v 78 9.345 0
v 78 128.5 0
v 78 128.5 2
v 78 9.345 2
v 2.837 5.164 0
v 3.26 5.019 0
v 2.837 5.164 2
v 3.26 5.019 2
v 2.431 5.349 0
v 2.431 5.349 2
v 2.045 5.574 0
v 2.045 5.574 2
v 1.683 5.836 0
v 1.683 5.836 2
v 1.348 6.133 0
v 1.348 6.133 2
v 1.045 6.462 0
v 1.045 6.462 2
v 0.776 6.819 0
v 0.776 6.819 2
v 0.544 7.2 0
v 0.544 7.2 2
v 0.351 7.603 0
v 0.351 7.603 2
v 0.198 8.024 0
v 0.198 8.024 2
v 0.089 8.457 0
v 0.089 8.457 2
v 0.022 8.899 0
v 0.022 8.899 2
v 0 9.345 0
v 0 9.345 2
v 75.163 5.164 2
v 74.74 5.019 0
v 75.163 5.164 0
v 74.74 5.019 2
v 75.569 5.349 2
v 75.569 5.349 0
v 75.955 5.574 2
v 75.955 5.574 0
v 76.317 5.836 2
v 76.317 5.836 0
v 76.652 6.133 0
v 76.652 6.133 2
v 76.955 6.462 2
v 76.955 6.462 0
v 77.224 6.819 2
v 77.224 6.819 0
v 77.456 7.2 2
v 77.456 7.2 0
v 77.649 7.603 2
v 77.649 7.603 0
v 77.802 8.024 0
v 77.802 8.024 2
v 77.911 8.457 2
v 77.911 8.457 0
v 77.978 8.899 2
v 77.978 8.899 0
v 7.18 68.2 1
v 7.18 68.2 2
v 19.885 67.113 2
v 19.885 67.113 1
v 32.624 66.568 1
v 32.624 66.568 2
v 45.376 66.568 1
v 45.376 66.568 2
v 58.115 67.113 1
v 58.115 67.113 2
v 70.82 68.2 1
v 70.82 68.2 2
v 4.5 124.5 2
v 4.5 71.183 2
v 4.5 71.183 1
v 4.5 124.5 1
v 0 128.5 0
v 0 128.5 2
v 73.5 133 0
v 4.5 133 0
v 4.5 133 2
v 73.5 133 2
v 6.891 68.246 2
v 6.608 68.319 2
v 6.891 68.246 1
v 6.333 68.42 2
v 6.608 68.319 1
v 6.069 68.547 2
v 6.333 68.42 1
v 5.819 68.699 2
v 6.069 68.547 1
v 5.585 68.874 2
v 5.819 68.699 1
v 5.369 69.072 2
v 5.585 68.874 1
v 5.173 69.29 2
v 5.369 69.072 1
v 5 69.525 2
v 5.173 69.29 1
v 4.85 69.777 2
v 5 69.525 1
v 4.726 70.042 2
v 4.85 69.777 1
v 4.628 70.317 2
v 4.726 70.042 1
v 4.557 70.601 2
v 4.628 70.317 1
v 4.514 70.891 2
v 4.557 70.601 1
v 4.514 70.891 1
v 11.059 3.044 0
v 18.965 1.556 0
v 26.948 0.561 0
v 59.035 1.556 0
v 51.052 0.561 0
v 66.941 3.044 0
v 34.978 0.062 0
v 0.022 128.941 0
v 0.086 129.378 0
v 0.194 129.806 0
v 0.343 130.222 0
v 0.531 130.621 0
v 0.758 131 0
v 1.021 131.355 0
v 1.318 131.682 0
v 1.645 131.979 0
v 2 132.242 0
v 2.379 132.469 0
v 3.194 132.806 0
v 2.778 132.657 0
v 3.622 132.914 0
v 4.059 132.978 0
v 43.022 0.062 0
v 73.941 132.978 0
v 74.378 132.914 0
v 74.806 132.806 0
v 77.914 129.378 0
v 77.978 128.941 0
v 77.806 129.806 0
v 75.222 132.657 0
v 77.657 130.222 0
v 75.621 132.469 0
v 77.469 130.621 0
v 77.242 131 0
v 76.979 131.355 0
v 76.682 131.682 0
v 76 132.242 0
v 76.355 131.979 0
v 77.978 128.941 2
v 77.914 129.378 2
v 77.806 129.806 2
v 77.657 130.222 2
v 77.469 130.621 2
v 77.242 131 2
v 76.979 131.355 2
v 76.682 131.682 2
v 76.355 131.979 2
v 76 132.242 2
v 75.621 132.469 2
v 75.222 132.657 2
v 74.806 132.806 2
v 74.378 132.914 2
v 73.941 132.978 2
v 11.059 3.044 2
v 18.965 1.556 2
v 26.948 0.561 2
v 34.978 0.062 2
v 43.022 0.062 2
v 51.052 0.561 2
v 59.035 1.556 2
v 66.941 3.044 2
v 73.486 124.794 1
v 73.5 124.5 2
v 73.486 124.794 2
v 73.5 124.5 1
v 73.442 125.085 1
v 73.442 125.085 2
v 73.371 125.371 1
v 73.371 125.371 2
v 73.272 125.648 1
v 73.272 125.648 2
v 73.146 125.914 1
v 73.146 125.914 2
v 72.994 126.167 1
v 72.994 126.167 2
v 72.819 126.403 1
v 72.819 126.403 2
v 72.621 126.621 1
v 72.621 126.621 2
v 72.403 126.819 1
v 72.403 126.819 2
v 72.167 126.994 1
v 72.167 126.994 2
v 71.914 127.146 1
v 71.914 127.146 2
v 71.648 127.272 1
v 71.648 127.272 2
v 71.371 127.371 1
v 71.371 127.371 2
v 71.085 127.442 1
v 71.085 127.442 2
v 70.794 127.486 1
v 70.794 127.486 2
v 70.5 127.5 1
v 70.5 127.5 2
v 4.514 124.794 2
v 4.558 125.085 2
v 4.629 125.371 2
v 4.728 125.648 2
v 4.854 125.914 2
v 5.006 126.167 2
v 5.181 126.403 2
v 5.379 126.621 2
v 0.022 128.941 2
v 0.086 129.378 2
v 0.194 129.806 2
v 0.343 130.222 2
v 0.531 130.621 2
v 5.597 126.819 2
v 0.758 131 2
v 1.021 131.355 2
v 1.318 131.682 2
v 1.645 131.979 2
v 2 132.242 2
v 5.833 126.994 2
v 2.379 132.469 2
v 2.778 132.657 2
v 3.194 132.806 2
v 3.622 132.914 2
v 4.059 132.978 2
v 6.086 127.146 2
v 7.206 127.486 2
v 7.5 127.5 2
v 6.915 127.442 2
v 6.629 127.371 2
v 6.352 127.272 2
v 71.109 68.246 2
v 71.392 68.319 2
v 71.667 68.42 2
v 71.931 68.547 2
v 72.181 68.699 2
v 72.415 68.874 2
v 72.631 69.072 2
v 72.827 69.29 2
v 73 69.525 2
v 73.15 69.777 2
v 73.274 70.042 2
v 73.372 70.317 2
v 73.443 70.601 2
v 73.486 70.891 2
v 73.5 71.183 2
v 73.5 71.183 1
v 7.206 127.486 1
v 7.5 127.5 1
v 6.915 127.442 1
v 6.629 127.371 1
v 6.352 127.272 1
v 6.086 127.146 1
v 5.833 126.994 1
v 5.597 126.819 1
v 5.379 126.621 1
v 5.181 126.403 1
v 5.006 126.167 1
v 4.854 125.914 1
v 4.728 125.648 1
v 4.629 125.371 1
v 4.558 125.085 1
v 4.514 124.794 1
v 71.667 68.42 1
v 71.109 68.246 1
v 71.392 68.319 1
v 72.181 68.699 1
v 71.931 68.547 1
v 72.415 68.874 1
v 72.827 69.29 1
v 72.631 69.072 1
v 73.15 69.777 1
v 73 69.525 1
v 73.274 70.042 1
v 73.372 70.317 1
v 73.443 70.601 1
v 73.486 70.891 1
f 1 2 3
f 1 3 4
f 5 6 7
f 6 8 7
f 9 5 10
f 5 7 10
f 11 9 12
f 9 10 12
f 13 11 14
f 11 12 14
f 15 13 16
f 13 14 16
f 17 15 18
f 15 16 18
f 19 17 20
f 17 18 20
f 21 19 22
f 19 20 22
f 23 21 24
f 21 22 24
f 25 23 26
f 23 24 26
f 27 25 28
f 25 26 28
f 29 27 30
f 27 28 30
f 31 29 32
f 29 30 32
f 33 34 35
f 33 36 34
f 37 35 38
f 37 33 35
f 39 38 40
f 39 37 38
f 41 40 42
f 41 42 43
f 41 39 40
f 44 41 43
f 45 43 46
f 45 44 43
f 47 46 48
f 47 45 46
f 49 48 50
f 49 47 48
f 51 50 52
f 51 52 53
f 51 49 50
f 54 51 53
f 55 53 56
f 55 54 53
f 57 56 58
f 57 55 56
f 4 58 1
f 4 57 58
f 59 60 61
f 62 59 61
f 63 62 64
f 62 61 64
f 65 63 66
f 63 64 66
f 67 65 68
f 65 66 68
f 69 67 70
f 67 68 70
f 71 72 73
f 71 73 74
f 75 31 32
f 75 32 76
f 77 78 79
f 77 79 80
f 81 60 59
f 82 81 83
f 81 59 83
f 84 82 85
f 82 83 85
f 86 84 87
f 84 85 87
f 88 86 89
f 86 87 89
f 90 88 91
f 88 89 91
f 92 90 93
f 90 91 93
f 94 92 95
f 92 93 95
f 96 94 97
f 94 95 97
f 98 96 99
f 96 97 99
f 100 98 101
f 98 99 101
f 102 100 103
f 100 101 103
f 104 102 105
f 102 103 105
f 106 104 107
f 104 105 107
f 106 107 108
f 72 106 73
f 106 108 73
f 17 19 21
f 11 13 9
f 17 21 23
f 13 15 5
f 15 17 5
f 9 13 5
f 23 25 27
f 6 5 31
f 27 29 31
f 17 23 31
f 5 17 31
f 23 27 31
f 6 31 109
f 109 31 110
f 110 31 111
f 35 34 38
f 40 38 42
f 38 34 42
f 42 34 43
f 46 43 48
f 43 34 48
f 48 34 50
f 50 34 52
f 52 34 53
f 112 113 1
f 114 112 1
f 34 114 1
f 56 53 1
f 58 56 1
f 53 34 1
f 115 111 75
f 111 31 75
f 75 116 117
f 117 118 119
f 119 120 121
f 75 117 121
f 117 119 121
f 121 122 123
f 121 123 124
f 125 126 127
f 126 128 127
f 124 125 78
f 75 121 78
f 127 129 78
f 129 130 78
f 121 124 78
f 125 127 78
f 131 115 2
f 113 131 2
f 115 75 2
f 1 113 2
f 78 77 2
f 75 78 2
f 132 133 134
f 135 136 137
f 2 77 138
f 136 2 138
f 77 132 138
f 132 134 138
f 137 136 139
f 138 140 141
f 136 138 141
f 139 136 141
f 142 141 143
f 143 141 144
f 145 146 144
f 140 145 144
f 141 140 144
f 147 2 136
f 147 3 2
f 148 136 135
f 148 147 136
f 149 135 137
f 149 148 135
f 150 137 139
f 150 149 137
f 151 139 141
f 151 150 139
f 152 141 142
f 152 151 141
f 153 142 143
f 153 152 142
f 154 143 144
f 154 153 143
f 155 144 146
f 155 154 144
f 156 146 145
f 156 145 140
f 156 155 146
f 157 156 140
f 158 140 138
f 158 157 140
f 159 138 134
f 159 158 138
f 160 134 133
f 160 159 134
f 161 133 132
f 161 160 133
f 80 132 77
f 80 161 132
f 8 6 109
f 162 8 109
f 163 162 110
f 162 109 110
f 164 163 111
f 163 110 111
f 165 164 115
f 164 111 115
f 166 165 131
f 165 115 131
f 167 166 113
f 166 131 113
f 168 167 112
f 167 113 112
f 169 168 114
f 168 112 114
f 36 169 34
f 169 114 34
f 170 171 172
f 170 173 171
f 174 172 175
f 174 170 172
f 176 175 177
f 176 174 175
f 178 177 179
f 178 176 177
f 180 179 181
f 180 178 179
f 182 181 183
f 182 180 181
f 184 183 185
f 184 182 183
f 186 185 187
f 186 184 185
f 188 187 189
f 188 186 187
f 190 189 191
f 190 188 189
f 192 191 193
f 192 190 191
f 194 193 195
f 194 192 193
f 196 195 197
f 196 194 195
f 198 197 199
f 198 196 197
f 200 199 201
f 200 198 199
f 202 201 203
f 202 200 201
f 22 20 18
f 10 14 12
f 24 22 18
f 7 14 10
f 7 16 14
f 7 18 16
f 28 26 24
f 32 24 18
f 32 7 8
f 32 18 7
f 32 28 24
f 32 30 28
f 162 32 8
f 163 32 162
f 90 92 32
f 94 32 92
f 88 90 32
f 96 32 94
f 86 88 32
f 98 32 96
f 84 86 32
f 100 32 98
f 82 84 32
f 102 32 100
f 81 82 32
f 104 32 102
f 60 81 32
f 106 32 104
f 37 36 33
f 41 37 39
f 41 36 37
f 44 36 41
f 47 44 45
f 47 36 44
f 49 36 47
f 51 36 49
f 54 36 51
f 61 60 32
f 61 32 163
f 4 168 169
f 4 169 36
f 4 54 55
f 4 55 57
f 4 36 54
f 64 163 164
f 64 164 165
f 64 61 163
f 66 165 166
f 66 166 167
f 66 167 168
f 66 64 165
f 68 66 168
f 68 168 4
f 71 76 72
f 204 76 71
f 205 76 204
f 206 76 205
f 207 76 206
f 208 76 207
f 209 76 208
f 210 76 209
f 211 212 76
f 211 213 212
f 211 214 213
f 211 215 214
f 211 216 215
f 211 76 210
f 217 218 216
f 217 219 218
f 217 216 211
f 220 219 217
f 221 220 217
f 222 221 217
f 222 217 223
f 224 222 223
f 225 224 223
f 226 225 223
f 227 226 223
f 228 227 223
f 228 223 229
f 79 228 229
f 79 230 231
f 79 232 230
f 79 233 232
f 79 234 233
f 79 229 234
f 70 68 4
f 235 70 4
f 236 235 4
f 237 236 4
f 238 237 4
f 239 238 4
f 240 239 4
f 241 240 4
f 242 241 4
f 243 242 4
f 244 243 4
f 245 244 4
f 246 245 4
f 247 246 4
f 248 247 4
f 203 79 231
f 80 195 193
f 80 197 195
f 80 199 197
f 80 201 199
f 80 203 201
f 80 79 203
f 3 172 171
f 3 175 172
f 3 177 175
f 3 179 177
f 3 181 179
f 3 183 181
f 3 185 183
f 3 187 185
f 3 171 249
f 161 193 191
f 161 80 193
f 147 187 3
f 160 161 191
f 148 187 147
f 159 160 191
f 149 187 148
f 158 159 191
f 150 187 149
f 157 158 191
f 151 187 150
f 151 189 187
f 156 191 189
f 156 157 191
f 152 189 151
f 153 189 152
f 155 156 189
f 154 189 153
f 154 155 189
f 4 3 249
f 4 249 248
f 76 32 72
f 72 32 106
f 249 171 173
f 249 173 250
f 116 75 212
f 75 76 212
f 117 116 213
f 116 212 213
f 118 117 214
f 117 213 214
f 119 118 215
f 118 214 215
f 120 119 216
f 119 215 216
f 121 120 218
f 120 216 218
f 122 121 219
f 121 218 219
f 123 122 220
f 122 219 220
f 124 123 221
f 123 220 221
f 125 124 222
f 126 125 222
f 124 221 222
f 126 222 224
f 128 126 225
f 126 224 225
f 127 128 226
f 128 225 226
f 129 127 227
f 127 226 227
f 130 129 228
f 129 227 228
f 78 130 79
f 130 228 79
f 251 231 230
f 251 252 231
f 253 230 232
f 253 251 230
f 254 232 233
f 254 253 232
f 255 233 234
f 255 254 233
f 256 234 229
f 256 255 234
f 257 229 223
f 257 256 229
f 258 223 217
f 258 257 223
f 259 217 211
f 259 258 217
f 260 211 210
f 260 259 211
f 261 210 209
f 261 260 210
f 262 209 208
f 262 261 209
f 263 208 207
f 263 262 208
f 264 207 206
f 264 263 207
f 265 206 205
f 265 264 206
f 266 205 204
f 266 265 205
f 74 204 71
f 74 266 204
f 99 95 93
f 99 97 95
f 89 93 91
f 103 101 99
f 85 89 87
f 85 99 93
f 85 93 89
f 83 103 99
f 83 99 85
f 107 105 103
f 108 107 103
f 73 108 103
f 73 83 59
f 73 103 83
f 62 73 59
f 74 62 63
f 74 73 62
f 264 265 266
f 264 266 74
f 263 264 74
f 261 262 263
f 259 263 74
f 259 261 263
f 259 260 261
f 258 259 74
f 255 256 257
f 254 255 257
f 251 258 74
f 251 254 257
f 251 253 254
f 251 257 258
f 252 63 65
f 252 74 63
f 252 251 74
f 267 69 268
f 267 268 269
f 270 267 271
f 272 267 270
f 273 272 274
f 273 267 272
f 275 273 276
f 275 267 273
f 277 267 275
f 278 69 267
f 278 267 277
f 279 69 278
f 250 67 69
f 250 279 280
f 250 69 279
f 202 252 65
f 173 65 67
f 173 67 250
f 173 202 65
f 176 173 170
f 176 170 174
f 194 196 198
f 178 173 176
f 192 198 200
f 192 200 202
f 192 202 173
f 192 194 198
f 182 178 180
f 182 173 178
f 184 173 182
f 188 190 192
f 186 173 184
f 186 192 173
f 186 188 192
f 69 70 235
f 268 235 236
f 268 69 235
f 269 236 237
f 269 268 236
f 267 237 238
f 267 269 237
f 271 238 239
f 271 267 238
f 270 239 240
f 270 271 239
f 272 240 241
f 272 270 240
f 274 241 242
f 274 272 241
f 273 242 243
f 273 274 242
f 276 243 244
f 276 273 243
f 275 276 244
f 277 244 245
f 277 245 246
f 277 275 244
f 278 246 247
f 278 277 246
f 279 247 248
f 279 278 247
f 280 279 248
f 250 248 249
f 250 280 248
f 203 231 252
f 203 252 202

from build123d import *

# Parameters (mm, degrees)
PAD_DEPTH    = 2
POCKET_DEPTH = 1
FILLET_R     = 3
FILLET001_R  = 4.5


with BuildPart() as part:
    # Sketch → Pad (new body)
    with BuildSketch(Plane.XY):
        with BuildLine():
            ThreePointArc((0, 6), (39, 0), (78, 6))
            Line((78, 133), (78, 6))
            Line((0, 133), (78, 133))
            Line((0, 6), (0, 133))
        make_face()
    extrude(amount=PAD_DEPTH)

    # Sketch001 (on Face6 of Pad) → Pocket (cut)
    with BuildSketch(Plane.XY.offset(2)):
        with BuildLine():
            ThreePointArc((4.5, 68.5), (39, 66.5), (73.5, 68.5))
            Line((73.5, 127.5), (73.5, 68.5))
            Line((4.5, 127.5), (73.5, 127.5))
            Line((4.5, 68.5), (4.5, 127.5))
        make_face()
    extrude(amount=-POCKET_DEPTH, mode=Mode.SUBTRACT)

    # Fillet
    fillet_edges = [part.edges().sort_by_distance(p)[0] for p in [
        (73.5, 68.5, 1.5),
        (73.5, 127.5, 1.5),
        (4.5, 127.5, 1.5),
        (4.5, 68.5, 1.5),
    ]]
    fillet(fillet_edges, radius=FILLET_R)

    # Fillet001
    fillet001_edges = [part.edges().sort_by_distance(p)[0] for p in [
        (78, 6, 1),
        (78, 133, 1),
        (0, 6, 1),
        (0, 133, 1),
    ]]
    fillet(fillet001_edges, radius=FILLET001_R)


solid = part.part
